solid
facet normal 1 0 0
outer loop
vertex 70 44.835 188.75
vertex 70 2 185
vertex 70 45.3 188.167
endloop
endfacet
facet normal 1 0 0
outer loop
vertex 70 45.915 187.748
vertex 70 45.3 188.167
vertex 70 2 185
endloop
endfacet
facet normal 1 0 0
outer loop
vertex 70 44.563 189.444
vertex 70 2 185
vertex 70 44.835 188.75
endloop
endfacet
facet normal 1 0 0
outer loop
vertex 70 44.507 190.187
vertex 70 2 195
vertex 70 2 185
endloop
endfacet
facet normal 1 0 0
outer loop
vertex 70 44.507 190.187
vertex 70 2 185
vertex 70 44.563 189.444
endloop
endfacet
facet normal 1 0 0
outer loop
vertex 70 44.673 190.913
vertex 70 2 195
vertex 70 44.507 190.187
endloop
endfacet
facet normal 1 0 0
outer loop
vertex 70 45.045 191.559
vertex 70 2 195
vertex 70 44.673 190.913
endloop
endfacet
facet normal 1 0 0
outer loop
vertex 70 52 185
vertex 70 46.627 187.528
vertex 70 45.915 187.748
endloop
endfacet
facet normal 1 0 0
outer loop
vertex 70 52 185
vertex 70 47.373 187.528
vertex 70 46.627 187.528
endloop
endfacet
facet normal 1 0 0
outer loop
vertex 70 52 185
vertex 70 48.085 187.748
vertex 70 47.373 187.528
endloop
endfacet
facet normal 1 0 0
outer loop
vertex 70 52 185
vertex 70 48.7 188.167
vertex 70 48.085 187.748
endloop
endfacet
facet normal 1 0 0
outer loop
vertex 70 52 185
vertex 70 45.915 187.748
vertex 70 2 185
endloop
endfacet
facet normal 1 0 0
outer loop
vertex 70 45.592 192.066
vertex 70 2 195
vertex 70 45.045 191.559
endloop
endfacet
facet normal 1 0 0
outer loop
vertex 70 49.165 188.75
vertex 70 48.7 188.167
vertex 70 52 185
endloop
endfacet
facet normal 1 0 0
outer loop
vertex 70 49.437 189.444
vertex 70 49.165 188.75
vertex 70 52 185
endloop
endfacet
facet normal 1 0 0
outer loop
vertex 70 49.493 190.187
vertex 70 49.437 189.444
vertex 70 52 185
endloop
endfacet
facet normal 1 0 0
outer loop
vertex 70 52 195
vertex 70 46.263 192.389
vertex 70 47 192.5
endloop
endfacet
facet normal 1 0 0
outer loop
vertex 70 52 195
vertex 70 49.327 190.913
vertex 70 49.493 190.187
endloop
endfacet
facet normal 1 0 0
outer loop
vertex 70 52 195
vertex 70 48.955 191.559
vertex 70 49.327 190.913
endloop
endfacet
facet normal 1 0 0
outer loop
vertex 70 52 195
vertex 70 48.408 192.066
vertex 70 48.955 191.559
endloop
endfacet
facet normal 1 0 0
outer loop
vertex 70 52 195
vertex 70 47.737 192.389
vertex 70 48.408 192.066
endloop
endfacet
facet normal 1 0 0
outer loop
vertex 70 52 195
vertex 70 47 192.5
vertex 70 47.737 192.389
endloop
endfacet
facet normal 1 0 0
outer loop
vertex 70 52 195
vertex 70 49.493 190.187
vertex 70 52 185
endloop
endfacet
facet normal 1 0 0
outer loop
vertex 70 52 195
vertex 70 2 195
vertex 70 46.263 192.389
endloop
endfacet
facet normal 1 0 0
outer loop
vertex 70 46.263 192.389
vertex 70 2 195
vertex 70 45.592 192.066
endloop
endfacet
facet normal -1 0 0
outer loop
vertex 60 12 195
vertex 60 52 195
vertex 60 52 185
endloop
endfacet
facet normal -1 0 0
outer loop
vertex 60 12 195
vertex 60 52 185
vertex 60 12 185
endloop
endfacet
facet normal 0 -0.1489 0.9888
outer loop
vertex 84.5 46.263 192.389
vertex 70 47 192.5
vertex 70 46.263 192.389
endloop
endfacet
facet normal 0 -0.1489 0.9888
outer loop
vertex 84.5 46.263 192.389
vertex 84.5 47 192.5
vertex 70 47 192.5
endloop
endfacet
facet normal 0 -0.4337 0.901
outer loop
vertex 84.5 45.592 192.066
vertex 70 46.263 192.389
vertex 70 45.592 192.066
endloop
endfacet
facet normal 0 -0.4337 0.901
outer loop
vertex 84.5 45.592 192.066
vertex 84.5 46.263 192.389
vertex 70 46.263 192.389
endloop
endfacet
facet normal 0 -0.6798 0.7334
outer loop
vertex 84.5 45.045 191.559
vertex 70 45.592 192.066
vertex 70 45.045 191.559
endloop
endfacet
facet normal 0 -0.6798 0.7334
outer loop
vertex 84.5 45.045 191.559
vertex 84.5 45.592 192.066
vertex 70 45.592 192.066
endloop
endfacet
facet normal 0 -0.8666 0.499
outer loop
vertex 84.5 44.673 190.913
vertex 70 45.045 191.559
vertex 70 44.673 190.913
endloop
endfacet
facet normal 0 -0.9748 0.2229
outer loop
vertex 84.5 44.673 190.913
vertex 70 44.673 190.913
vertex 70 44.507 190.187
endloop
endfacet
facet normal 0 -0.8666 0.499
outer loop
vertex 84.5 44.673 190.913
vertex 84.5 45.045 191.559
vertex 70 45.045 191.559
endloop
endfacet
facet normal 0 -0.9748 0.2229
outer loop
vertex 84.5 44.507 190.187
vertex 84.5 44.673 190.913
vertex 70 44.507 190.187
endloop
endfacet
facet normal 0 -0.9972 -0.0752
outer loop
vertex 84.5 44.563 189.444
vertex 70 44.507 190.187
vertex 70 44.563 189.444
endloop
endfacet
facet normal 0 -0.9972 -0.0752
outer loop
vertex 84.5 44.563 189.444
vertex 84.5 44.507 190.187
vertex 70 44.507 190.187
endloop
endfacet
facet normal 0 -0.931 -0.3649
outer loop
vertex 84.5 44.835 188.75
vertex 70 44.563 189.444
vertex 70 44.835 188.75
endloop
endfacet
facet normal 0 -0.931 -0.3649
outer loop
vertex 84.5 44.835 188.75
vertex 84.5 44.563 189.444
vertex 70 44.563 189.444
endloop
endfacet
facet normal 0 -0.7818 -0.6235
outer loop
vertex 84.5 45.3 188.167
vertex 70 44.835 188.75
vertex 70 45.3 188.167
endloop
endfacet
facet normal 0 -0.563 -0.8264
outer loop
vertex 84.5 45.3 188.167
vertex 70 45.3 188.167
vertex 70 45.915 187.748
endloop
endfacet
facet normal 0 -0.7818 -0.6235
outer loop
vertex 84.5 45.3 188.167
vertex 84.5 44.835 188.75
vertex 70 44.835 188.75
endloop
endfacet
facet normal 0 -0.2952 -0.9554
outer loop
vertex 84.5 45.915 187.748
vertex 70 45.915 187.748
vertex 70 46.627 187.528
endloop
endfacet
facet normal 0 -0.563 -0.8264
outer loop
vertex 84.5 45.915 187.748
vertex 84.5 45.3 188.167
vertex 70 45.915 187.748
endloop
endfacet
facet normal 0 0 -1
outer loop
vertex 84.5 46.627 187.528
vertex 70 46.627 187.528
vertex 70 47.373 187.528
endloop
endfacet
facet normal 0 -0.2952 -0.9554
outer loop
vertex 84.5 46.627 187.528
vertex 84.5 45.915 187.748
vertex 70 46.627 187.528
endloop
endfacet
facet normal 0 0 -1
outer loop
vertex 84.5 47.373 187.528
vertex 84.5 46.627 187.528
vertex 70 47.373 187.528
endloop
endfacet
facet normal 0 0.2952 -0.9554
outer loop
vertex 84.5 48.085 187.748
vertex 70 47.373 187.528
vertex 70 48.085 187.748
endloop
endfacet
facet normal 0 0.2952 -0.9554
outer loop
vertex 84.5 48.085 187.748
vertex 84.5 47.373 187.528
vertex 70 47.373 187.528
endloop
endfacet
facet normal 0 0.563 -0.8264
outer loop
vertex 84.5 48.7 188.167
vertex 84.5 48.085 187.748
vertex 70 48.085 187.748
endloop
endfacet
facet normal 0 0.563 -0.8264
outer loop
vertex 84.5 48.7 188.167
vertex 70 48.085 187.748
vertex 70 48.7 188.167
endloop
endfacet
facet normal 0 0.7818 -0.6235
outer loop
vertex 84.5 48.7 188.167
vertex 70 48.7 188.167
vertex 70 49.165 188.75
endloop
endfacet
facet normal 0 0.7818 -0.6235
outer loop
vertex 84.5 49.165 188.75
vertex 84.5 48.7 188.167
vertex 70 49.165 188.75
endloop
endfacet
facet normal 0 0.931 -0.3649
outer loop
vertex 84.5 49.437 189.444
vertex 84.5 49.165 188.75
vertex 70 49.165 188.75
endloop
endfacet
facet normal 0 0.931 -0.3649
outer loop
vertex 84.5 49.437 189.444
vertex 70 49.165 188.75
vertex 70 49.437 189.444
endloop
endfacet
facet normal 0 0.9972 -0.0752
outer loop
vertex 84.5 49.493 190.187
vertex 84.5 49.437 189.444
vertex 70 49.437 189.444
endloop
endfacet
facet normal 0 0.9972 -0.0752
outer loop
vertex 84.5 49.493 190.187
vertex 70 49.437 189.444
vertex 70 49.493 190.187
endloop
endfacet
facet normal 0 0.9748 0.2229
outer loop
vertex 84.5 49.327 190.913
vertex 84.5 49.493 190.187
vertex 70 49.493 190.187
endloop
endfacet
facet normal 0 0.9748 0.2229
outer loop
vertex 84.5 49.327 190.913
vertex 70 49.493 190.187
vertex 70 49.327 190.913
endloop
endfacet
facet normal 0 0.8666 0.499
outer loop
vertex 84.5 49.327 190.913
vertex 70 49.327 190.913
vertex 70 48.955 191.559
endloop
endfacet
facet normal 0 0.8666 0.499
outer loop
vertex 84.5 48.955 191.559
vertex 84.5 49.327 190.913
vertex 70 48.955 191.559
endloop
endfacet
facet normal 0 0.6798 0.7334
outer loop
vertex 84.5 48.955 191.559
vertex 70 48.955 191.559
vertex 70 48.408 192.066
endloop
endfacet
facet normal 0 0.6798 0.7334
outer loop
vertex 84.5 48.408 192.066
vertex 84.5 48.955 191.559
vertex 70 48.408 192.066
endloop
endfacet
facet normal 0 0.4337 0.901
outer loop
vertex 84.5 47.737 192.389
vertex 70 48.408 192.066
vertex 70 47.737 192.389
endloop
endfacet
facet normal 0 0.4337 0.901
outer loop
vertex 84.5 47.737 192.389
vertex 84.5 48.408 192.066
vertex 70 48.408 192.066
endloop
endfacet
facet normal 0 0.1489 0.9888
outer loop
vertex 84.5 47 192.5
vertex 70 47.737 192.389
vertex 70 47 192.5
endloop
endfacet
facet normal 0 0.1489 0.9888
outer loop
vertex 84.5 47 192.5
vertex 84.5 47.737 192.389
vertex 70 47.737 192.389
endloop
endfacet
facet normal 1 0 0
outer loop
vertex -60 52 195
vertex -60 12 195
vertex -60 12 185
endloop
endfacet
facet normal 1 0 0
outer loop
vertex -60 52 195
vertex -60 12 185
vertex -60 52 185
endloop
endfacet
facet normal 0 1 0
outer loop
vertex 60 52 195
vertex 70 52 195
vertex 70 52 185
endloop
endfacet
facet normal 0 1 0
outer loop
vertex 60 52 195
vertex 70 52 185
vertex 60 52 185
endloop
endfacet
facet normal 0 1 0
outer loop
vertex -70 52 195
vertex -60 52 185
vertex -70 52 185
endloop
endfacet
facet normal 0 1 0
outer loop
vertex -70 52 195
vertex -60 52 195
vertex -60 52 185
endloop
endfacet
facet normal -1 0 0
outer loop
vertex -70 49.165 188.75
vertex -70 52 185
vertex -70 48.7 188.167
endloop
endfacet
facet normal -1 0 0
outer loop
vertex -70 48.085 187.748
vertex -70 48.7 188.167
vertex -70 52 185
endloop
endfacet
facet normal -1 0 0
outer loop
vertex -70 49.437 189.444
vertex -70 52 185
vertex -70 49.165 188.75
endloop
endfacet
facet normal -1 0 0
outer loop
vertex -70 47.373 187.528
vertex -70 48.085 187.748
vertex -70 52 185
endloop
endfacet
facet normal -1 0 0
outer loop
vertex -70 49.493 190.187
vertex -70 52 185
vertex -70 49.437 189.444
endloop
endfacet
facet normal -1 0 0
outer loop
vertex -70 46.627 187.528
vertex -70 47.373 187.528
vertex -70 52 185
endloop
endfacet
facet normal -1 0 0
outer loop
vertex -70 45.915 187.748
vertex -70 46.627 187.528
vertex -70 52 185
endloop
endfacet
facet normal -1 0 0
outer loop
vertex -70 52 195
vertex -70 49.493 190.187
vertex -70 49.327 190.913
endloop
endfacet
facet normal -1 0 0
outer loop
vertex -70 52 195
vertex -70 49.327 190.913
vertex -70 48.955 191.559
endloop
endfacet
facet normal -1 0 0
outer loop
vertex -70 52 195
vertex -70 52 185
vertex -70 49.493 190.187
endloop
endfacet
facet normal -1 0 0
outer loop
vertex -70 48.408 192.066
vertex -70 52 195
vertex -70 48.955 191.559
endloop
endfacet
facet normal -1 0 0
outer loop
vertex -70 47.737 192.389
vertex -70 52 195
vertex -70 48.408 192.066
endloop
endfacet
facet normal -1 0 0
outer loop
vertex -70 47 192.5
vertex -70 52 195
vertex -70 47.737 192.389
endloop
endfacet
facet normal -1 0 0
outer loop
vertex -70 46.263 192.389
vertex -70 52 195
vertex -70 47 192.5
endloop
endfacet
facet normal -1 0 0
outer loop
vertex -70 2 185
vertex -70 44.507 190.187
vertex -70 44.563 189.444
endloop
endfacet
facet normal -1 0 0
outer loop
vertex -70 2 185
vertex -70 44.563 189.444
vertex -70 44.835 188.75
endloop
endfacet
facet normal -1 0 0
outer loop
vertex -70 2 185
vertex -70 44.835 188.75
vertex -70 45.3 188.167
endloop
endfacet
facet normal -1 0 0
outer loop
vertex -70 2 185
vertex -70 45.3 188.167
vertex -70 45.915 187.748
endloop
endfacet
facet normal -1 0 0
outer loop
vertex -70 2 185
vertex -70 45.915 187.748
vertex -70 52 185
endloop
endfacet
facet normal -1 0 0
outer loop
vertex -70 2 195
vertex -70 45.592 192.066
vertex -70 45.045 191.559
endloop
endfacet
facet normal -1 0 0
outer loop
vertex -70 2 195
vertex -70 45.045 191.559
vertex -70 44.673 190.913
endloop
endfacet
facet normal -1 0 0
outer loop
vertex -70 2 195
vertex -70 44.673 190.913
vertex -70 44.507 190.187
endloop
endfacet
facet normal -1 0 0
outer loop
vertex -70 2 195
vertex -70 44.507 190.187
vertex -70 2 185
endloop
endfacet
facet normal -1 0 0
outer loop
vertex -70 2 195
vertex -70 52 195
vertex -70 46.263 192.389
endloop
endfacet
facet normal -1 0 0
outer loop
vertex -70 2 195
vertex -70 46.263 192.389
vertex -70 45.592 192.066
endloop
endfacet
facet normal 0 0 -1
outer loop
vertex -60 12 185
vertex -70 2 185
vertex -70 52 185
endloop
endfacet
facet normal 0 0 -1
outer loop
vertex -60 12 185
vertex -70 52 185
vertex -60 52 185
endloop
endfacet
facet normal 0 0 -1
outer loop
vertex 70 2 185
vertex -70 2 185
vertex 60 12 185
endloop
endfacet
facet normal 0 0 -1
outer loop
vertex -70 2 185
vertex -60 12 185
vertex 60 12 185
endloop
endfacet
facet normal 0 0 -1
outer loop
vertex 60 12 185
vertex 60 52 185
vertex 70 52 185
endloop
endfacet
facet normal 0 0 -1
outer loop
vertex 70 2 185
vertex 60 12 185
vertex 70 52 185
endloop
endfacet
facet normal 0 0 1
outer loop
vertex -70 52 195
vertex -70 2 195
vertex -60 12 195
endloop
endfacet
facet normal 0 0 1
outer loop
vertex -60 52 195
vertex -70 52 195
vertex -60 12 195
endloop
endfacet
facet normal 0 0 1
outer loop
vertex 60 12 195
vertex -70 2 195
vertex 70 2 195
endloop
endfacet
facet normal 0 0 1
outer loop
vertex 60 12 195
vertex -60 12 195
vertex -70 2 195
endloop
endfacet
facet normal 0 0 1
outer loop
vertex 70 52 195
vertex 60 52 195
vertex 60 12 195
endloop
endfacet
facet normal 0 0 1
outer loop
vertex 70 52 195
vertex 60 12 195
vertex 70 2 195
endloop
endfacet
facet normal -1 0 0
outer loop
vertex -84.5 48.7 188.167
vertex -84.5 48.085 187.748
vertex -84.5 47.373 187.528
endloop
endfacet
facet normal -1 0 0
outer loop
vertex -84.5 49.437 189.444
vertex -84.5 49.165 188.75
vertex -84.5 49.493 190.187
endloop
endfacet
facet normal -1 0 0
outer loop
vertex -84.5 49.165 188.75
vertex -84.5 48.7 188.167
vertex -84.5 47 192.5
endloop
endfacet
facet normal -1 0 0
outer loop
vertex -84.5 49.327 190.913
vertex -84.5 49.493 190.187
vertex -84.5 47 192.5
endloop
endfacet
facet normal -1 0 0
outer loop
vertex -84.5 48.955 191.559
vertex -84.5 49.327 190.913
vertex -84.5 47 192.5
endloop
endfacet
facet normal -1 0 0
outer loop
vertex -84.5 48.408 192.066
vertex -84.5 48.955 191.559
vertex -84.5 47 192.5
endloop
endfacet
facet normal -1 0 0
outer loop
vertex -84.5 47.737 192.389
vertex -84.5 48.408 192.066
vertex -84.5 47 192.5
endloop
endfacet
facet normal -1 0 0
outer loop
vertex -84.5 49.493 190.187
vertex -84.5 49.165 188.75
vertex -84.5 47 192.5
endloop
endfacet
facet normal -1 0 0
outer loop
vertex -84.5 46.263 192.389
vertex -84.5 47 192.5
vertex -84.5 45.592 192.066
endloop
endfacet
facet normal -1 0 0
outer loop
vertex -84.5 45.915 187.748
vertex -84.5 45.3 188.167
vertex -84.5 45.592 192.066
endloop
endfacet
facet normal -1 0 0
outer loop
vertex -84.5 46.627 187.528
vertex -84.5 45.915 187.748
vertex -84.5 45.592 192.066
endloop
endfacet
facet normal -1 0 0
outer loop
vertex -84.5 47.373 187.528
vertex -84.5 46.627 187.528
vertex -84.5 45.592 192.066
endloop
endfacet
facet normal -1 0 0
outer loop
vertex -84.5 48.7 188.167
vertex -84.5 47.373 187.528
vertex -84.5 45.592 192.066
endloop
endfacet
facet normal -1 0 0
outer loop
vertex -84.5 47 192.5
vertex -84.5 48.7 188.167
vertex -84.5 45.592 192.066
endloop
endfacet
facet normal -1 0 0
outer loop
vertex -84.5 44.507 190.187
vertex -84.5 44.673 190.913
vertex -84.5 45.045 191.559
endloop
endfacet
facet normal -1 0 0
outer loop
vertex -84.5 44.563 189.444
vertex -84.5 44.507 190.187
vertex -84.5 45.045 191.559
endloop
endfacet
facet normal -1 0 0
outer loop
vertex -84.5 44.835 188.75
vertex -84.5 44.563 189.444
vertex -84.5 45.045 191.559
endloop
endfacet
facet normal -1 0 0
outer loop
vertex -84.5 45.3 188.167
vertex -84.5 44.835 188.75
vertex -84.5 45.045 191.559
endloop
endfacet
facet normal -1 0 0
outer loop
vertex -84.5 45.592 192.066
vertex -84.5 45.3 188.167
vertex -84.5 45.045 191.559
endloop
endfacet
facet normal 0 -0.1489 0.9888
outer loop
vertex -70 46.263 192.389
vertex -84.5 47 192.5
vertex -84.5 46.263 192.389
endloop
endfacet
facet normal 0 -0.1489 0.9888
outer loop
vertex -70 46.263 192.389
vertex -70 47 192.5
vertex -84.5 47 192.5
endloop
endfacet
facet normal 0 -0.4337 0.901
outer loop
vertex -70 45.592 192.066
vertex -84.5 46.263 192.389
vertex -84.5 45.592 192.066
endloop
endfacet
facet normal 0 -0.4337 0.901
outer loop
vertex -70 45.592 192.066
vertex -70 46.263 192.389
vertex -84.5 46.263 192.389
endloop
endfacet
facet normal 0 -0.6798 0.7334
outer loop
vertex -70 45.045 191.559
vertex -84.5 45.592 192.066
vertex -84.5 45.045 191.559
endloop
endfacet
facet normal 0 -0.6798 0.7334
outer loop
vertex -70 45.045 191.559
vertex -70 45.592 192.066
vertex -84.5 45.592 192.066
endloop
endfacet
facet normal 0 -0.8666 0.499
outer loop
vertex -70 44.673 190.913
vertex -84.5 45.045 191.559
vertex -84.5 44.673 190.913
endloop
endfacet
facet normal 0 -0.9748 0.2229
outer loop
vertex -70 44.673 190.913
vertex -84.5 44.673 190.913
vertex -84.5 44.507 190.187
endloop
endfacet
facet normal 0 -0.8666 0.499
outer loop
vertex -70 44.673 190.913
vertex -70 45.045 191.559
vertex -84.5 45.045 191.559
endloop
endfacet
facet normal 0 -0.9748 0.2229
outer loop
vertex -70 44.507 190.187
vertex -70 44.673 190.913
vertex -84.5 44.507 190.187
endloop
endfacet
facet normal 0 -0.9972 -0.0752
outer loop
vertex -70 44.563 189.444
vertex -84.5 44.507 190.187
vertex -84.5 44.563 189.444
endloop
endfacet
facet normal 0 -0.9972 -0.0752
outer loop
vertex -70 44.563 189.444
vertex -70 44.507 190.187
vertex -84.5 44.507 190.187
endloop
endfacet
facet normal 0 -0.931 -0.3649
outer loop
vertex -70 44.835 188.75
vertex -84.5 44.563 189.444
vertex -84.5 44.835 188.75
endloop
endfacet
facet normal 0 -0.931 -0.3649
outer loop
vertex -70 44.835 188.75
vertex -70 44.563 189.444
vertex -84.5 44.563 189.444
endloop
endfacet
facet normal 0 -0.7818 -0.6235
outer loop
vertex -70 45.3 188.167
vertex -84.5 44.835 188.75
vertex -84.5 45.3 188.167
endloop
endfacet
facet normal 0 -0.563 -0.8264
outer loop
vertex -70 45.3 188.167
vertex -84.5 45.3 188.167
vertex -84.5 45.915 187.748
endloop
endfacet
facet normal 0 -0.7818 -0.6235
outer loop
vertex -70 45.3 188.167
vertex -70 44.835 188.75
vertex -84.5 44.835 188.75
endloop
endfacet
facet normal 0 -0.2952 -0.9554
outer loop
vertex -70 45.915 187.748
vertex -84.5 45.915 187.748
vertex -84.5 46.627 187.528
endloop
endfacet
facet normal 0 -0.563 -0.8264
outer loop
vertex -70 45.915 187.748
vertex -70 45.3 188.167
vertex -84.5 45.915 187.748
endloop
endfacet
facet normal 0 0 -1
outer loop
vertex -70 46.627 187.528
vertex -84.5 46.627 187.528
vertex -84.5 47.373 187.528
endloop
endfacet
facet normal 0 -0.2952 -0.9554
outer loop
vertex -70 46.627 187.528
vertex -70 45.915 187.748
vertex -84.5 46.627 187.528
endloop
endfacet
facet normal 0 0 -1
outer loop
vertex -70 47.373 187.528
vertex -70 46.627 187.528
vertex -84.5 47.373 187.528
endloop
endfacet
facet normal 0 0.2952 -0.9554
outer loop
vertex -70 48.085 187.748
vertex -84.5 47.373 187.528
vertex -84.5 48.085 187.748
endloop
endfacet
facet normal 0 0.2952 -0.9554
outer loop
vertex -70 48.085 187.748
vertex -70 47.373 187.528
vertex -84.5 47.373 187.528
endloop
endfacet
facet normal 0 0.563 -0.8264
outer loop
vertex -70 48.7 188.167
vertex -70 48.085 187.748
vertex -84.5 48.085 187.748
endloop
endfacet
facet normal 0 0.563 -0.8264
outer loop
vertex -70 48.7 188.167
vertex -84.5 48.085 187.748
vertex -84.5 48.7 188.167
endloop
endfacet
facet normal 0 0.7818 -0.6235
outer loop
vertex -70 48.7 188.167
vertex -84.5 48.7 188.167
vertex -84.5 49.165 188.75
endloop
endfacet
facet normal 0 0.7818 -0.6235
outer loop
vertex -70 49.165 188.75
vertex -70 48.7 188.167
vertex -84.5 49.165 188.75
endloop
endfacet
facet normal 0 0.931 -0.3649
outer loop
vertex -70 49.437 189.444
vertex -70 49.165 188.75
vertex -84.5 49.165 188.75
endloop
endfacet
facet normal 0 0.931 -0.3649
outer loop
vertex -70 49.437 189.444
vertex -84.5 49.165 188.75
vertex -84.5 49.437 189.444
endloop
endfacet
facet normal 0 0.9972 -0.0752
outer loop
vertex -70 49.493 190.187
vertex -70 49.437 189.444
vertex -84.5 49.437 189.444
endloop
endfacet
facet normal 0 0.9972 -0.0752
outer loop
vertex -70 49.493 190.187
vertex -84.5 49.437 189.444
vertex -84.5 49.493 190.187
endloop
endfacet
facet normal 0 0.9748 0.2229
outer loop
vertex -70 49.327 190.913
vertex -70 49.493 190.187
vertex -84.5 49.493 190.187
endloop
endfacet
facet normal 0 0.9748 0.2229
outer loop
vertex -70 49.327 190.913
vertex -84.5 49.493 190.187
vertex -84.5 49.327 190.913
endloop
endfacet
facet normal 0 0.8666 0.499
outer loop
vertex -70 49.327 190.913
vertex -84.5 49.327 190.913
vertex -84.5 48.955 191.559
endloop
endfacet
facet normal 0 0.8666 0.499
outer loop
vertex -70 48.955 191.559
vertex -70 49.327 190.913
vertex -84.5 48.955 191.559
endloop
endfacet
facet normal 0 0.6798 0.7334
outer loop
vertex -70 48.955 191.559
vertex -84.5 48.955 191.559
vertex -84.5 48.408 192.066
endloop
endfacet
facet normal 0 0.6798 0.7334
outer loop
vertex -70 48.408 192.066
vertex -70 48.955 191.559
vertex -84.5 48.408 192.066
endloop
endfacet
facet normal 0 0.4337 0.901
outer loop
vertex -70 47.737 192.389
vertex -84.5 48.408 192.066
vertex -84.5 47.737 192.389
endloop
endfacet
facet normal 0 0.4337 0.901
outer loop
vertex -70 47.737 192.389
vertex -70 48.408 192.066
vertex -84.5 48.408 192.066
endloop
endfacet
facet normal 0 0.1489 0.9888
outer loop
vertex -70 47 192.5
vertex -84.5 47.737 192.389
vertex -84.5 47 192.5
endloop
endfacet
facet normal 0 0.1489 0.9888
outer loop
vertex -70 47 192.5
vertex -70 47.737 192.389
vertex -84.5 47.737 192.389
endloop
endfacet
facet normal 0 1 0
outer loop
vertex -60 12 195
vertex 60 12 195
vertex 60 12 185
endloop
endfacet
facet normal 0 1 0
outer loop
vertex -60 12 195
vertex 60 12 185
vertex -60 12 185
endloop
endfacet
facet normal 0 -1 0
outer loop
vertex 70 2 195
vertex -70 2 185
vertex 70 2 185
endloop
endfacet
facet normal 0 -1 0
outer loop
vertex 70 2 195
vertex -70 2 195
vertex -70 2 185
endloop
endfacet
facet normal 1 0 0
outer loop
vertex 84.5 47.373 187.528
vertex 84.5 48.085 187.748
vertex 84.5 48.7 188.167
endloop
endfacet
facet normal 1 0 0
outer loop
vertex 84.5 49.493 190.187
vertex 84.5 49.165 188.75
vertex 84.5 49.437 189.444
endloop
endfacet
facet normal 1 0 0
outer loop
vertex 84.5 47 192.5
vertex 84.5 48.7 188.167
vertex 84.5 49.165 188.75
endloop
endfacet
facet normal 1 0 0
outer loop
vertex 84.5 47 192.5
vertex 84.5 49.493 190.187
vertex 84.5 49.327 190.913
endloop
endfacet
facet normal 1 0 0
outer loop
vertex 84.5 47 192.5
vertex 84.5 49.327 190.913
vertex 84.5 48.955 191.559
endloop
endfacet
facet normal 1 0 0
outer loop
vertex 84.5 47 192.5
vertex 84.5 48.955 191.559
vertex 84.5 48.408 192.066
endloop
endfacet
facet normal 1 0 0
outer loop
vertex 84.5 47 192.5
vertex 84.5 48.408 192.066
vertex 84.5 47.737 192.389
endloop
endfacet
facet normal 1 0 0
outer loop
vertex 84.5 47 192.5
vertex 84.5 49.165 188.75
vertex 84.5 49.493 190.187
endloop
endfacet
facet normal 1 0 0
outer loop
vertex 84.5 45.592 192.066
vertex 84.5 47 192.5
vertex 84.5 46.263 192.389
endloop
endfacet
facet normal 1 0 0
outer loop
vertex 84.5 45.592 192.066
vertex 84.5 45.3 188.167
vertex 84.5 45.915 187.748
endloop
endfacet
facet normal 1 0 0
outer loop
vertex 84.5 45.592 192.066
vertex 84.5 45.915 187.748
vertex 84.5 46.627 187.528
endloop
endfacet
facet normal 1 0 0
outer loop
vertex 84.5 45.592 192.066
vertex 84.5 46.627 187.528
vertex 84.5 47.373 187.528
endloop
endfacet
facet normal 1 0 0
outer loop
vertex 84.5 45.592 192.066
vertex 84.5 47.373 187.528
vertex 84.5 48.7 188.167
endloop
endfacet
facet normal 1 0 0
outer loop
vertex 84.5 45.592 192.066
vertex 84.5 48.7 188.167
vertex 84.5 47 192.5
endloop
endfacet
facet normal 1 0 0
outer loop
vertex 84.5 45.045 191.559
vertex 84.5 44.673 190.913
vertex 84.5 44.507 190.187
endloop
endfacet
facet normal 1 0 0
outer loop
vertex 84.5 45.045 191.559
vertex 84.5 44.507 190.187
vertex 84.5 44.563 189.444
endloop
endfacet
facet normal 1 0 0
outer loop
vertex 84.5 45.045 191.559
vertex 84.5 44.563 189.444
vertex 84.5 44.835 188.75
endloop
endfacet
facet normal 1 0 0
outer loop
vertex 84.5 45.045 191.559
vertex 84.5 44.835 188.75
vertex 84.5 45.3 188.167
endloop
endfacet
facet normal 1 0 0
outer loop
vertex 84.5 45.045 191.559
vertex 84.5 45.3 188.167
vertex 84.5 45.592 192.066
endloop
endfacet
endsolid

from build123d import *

# Parameters (mm, degrees)
BOSS_EXTRUDE1_DEPTH = 5
SKETCH2_R           = 2.5
BOSS_EXTRUDE2_DEPTH = 7.25
SKETCH3_R           = 2.5
BOSS_EXTRUDE3_DEPTH = 7.25


with BuildPart() as part:
    # Sketch1 → Boss-Extrude1 (new, symmetric)
    with BuildSketch(Plane.XY.offset(190)):
        Polygon((-70, 2), (70, 2), (70, 52), (60, 52), (60, 12), (-60, 12), (-60, 52), (-70, 52), align=None)
    extrude(amount=BOSS_EXTRUDE1_DEPTH, both=True)

    # Sketch2 → Boss-Extrude2 (add, symmetric)
    with BuildSketch(Plane(origin=(-77.25, 0, 0), x_dir=(0, 0, -1), z_dir=(1, 0, 0))):
        with Locations(Location((-190, 47, 0), (0, 0, 180))):
            Circle(SKETCH2_R)
    extrude(amount=BOSS_EXTRUDE2_DEPTH, both=True)

    # Sketch3 → Boss-Extrude3 (add, symmetric)
    with BuildSketch(Plane(origin=(77.25, 0, 0), x_dir=(0, 0, -1), z_dir=(1, 0, 0))):
        with Locations(Location((-190, 47, 0), (0, 0, 180))):
            Circle(SKETCH3_R)
    extrude(amount=BOSS_EXTRUDE3_DEPTH, both=True)


solid = part.part
